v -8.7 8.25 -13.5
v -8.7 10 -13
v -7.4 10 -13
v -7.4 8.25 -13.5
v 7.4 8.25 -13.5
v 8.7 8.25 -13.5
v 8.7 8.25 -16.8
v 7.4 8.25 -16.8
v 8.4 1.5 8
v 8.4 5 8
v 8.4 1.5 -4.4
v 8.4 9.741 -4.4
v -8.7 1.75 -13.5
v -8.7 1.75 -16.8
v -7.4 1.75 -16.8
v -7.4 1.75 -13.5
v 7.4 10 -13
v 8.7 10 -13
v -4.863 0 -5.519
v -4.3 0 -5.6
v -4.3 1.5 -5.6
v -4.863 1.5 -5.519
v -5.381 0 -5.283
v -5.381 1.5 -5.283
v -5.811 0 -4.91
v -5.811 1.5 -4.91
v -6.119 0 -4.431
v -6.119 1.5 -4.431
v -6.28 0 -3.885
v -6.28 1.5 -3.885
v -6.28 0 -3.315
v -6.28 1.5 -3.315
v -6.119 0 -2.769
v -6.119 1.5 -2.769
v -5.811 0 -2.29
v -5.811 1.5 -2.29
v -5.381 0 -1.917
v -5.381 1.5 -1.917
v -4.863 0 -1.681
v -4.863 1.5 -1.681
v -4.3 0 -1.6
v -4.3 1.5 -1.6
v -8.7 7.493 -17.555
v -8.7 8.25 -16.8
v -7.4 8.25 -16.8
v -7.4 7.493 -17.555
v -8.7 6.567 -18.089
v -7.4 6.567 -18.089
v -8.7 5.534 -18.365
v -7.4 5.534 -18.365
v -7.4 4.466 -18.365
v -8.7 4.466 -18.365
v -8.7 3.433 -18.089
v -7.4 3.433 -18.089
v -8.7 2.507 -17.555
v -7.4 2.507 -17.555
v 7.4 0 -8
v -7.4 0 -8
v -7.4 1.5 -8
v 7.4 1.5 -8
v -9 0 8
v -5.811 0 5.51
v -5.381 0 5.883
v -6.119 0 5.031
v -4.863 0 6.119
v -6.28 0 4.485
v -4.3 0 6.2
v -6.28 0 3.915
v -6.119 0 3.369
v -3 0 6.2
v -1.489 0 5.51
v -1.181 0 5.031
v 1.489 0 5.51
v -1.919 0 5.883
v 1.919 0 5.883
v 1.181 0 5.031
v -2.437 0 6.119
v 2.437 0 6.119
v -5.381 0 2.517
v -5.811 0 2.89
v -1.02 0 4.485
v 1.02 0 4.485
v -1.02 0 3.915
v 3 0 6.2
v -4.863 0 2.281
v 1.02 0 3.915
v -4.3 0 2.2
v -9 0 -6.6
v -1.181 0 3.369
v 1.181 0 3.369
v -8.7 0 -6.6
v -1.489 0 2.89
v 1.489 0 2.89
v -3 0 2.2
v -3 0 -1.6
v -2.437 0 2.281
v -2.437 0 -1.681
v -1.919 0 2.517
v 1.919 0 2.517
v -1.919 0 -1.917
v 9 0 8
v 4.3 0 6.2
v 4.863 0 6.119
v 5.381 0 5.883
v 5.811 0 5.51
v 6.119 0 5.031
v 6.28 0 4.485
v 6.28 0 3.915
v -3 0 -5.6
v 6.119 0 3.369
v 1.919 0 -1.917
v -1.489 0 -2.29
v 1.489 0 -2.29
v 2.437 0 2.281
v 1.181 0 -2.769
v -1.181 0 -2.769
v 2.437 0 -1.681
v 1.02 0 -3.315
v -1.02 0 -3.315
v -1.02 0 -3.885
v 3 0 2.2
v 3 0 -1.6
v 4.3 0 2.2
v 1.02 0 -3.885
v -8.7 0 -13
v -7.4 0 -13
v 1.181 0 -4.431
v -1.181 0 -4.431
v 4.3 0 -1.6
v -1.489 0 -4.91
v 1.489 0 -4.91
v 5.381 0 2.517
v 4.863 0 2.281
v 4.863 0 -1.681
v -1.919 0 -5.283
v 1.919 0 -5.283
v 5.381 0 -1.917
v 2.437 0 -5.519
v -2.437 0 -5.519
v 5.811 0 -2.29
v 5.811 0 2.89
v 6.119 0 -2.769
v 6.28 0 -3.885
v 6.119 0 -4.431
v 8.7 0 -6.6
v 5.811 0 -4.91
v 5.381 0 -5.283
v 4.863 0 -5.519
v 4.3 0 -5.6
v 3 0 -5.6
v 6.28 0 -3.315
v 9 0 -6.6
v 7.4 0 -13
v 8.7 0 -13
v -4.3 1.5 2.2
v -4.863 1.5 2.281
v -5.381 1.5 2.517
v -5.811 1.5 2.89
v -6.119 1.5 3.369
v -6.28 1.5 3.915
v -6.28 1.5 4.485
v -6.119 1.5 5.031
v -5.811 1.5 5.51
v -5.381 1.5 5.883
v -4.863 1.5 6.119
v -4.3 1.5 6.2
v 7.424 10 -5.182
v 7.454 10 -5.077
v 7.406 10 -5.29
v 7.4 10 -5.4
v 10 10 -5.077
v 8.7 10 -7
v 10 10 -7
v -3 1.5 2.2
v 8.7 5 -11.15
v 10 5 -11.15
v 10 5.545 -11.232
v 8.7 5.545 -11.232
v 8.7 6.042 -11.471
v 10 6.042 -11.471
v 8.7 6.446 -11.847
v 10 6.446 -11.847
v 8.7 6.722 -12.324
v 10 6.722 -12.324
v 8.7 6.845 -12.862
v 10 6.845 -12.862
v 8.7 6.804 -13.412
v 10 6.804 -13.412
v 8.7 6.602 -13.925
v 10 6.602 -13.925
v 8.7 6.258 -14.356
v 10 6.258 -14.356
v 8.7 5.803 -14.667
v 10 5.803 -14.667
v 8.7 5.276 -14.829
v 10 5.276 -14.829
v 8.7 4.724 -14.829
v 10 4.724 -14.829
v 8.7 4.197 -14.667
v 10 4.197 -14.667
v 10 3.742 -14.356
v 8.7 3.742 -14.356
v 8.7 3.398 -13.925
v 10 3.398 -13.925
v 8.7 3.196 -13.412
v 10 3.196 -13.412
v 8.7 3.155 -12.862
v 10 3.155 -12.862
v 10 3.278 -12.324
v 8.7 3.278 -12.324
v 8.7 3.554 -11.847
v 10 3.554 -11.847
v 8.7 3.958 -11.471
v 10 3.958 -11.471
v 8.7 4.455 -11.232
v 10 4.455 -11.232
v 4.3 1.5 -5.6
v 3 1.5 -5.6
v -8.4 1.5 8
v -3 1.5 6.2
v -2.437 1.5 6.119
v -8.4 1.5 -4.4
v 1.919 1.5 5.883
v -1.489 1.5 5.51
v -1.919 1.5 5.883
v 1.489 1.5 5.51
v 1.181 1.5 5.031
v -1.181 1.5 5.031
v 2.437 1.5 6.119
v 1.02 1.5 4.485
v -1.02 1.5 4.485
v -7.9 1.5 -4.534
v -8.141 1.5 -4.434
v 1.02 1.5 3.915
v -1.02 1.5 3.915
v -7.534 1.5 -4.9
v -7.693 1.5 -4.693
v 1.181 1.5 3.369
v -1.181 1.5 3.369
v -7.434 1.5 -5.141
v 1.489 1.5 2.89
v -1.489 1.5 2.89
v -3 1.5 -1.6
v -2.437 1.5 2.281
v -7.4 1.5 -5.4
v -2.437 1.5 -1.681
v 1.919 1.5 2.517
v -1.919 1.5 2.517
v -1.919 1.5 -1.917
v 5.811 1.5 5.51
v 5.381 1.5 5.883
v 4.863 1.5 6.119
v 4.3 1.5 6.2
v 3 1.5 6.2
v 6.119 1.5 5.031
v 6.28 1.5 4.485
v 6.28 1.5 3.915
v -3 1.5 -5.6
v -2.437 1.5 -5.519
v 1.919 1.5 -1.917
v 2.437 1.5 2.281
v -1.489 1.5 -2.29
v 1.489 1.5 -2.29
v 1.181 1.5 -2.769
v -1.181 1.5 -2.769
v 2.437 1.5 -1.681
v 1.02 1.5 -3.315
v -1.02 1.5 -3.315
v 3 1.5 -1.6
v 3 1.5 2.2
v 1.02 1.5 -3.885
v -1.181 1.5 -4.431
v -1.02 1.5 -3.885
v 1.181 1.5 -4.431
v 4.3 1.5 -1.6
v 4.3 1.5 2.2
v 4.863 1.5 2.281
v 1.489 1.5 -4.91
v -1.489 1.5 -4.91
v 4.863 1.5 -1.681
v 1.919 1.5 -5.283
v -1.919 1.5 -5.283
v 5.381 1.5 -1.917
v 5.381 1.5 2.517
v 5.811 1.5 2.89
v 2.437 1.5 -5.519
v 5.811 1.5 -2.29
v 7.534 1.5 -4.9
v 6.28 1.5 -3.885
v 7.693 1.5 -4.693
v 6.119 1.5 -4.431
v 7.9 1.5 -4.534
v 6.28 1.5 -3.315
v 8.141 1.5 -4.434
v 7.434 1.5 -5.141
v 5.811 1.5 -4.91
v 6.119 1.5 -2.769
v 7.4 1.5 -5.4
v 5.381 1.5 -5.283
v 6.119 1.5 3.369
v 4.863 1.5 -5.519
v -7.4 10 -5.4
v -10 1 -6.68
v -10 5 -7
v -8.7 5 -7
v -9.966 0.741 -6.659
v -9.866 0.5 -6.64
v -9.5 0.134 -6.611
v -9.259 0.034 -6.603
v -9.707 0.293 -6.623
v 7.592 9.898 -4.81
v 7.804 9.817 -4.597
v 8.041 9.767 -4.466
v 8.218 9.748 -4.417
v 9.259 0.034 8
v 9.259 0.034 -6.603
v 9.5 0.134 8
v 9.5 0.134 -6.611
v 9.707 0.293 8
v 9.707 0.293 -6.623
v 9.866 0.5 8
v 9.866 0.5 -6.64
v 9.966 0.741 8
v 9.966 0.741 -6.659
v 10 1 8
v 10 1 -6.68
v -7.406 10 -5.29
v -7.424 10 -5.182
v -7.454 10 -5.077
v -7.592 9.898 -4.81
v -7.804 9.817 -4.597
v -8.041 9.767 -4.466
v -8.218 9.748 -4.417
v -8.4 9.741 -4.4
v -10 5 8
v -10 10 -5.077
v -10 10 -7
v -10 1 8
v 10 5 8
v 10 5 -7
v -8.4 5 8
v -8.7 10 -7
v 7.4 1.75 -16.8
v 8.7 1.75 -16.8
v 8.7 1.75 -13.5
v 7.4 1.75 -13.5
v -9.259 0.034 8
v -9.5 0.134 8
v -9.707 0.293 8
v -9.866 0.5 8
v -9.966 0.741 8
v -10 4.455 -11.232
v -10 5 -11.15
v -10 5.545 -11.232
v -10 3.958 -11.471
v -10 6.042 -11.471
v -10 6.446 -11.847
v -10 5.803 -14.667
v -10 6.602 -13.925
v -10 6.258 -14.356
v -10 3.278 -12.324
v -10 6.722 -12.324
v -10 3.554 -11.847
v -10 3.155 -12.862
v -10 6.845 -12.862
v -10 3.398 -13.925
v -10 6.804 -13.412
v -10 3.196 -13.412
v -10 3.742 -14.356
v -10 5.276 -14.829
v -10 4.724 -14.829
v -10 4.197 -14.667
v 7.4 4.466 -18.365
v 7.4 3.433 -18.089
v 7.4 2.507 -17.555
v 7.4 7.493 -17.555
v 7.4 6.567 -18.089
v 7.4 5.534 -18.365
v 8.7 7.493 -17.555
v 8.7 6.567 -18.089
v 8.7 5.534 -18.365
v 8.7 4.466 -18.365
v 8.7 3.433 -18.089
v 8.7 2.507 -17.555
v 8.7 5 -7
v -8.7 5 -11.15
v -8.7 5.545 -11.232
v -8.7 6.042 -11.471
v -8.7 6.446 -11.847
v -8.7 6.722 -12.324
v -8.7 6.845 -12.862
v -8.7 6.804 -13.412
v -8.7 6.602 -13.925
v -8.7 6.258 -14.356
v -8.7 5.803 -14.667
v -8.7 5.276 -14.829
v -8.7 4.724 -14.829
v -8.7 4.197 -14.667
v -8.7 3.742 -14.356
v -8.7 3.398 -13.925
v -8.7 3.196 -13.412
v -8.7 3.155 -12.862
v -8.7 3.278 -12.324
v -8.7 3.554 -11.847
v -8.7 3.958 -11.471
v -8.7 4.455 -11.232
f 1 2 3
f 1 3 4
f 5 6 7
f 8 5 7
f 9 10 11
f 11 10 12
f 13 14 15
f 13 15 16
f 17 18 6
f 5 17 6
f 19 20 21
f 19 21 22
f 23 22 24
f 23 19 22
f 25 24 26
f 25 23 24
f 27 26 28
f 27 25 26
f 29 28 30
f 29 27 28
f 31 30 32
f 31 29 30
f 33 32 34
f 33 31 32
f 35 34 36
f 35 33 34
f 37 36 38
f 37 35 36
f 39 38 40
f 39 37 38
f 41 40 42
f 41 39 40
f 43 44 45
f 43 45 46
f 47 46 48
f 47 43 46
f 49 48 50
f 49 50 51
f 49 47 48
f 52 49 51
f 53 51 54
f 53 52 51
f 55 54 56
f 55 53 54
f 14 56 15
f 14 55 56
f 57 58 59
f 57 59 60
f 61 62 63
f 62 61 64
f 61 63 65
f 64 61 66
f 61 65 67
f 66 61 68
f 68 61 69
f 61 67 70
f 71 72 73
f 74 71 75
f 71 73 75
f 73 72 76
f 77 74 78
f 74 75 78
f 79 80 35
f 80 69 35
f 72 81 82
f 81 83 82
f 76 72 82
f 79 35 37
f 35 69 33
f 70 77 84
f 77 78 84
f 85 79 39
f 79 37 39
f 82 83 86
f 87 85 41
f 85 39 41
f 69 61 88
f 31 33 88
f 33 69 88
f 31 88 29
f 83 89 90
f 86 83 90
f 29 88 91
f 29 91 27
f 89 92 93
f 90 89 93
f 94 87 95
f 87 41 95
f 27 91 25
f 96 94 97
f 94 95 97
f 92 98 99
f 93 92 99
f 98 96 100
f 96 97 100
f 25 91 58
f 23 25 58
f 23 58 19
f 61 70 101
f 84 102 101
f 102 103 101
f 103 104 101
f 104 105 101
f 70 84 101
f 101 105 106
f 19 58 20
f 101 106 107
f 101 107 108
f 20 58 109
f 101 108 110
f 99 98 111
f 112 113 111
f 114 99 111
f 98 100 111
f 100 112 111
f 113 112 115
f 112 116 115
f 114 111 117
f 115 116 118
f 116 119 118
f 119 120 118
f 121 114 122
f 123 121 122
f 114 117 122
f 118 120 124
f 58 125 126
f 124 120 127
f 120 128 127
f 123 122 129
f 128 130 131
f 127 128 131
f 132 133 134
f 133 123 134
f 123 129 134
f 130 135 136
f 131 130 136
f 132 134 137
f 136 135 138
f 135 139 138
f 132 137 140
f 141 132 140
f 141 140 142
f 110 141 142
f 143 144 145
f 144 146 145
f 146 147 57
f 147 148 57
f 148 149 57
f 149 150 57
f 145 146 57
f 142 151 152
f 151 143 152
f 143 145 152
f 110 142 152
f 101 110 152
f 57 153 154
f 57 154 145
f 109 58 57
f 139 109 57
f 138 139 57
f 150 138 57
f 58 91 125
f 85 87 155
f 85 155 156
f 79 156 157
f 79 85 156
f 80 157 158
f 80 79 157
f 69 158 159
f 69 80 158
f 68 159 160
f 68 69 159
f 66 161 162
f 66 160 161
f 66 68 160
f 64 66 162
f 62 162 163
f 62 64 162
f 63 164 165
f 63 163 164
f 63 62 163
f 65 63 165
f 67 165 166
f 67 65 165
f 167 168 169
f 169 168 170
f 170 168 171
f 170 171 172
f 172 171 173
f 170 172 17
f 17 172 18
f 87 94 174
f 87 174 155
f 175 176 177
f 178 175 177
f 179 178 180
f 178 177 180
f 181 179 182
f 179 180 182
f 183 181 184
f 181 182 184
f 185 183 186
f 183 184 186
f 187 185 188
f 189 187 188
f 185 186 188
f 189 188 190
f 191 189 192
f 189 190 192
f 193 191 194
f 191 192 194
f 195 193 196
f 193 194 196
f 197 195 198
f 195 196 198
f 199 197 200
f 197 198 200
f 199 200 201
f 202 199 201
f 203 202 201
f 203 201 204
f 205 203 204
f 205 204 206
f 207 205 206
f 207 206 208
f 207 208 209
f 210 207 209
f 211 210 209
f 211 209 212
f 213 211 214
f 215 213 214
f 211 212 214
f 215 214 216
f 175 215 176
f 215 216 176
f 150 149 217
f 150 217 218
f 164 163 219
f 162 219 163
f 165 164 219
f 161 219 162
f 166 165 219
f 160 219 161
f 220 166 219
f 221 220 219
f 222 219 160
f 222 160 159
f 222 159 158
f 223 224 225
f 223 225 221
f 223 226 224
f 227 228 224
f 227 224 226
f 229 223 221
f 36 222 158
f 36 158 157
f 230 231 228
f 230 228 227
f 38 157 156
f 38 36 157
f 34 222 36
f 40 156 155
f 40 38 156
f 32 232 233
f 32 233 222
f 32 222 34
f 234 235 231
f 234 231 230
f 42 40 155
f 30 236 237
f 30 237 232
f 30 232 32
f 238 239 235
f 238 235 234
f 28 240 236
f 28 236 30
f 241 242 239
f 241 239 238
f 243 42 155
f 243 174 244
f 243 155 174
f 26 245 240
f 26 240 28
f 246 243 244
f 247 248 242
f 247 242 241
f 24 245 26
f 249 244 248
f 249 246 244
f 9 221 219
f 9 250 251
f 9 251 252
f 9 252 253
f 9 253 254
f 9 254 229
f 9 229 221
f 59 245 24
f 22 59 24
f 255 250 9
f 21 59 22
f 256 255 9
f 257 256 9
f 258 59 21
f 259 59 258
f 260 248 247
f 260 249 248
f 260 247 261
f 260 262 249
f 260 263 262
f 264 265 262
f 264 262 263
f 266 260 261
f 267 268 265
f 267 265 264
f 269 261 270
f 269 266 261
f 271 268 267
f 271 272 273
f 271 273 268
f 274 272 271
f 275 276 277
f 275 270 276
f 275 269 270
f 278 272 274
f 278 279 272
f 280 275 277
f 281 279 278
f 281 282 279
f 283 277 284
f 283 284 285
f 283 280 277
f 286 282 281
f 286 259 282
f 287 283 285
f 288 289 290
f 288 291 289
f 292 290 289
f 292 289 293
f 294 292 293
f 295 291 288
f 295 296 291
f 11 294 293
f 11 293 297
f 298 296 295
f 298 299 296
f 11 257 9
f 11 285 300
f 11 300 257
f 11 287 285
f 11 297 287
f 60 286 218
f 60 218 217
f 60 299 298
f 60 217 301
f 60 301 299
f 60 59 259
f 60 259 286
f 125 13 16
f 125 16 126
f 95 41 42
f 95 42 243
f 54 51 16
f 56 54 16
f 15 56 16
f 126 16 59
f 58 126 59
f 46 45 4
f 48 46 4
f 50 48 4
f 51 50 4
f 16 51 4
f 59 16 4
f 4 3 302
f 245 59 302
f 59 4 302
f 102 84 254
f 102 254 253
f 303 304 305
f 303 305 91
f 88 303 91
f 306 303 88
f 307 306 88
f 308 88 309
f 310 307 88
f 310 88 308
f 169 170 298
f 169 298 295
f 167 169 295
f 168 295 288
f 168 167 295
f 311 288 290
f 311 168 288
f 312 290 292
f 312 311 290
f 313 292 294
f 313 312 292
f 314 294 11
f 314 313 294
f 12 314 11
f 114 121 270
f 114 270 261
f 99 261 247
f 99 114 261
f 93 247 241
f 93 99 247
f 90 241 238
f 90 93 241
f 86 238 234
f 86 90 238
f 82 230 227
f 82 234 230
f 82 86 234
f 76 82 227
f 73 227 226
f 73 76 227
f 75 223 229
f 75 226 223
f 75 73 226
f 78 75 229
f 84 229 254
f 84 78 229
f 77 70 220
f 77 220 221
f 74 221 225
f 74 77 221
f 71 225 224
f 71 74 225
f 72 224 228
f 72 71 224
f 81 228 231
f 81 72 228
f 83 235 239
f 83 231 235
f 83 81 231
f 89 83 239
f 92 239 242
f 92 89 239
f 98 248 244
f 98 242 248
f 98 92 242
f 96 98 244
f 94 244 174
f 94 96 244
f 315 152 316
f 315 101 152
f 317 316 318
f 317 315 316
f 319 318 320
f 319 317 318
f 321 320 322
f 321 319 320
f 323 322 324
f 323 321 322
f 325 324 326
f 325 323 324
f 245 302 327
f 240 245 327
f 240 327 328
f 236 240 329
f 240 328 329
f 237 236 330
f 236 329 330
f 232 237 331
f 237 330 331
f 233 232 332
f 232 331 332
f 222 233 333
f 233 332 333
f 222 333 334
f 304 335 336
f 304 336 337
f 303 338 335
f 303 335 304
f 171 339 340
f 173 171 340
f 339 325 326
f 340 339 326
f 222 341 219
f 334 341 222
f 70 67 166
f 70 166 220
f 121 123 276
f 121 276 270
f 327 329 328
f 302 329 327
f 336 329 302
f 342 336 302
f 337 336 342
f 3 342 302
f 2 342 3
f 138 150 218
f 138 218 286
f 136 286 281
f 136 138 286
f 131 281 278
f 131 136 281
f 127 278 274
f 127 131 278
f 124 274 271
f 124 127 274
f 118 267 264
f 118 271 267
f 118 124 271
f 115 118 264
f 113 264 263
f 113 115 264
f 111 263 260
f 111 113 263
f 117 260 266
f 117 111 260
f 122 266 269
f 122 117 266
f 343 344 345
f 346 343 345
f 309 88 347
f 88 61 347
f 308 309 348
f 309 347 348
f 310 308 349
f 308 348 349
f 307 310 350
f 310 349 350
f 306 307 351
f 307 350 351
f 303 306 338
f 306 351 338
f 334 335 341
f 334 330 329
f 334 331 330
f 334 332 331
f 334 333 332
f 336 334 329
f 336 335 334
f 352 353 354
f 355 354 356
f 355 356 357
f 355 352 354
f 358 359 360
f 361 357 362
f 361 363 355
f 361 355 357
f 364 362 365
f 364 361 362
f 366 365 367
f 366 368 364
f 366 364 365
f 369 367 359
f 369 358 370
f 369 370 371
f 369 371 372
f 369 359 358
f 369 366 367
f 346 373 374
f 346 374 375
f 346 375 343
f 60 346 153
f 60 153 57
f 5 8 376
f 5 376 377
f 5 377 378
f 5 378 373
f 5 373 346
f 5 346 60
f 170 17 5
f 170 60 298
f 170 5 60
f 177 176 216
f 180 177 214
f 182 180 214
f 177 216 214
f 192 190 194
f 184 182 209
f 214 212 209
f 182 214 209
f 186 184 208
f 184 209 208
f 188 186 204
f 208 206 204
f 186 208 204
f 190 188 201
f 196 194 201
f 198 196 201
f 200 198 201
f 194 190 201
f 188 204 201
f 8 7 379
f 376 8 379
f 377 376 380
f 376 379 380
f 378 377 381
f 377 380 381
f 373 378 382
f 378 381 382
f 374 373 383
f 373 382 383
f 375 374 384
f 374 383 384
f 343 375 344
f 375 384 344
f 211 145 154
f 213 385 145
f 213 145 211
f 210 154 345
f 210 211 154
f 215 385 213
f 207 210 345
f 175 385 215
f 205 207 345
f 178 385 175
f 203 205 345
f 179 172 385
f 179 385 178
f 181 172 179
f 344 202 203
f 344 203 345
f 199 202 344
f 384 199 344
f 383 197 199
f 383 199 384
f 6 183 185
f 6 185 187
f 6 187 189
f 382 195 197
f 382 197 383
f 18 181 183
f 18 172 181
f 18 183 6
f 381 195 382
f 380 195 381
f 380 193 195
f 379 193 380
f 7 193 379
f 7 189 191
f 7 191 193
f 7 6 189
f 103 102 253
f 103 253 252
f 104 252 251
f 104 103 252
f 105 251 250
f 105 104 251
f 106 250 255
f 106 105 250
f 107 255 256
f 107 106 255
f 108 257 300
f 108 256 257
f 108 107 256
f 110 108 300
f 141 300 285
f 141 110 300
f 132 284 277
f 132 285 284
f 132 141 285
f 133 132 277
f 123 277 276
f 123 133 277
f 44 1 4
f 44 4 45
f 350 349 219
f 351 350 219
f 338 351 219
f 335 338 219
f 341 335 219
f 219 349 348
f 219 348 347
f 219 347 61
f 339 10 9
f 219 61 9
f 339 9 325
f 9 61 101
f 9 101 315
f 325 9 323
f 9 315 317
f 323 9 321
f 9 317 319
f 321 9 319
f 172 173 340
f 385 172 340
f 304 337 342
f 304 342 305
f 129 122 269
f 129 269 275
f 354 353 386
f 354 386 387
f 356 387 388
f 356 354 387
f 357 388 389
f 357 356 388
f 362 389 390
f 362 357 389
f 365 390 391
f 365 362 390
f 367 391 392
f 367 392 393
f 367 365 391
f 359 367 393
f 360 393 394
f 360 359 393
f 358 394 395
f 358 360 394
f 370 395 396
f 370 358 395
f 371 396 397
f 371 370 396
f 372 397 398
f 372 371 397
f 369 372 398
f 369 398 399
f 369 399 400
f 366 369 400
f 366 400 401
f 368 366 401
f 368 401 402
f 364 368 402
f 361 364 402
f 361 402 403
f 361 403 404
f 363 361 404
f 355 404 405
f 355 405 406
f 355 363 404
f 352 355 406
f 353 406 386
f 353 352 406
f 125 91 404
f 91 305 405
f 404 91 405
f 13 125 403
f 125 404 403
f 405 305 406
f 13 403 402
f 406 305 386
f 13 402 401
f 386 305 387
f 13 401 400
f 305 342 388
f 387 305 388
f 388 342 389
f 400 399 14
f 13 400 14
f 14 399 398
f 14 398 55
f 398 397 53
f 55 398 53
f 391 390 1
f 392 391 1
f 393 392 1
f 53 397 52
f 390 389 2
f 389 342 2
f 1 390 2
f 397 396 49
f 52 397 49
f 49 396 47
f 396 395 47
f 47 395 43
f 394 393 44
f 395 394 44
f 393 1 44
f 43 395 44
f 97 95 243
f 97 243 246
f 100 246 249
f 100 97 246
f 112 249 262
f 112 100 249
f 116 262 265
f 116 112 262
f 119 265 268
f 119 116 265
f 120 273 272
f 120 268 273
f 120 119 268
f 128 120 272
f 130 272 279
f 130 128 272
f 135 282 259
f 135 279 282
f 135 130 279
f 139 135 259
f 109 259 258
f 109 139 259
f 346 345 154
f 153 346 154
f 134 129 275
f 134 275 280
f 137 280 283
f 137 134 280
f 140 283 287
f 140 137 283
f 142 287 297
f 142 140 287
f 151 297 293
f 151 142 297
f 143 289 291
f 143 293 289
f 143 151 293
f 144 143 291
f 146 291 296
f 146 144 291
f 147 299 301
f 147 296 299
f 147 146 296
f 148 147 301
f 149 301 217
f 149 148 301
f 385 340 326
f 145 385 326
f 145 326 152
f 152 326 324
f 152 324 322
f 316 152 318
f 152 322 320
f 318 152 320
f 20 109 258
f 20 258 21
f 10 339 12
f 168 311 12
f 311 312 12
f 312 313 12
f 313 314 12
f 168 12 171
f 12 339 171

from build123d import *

# Parameters (mm, degrees)
SKETCH1_W           = 20
SKETCH1_H           = 16
BOSS_EXTRUDE1_DEPTH = 1.5
BOSS_EXTRUDE2_DEPTH = 2.6
CUT_EXTRUDE1_DEPTH  = 1
SKETCH4_R           = 1.85
CUT_EXTRUDE2_DEPTH  = 1.3
CUT_EXTRUDE3_DEPTH  = 4.3
FILLET1_R           = 1


with BuildPart() as part:
    # Sketch1 → Boss-Extrude1 (new body)
    with BuildSketch(Plane(origin=(0, 0, 0), x_dir=(1, 0, 0), z_dir=(0, 1, 0))):
        Rectangle(SKETCH1_W, SKETCH1_H)
    extrude(amount=BOSS_EXTRUDE1_DEPTH)

    # Sketch2 → Boss-Extrude2 (add)
    with BuildSketch(Plane.ZY.offset(10)):
        with BuildLine():
            Line((8, 0), (8, 5))
            Line((8, 5), (-5.076696831, 10))
            Line((-5.076696831, 10), (-13, 10))
            Line((-13, 10), (-13.5, 8.25))
            Line((-13.5, 8.25), (-16.8, 8.25))
            ThreePointArc((-16.8, 8.25), (-18.4, 5), (-16.8, 1.75))
            Line((-16.8, 1.75), (-13.5, 1.75))
            Line((-13.5, 1.75), (-13, 0))
            Line((-13, 0), (8, 0))
        make_face()
    boss_extrude2 = extrude(amount=-BOSS_EXTRUDE2_DEPTH)

    # Sketch3 → Cut-Extrude1 (cut)
    with BuildSketch(Plane(origin=(-7.4, 0, 0), x_dir=(0, 0, -1), z_dir=(1, 0, 0))):
        Polygon((-8, 1.5), (4.4, 1.5), (4.4, 9.7412585), (-8, 5), align=None)
    cut_extrude1 = extrude(amount=-CUT_EXTRUDE1_DEPTH, mode=Mode.SUBTRACT)

    # Sketch4 → Cut-Extrude2 (cut)
    with BuildSketch(Plane.ZY.offset(10)):
        Polygon((-18.672915143, 10), (-7, 10), (-7, 5), (-6.6, 0), (-8.743784953, 0), (-18.672915143, 0), align=None)
        with Locations((-13, 5)):
            Circle(SKETCH4_R, mode=Mode.SUBTRACT)
    cut_extrude2 = extrude(amount=-CUT_EXTRUDE2_DEPTH, mode=Mode.SUBTRACT)

    # Mirror1: Boss-Extrude2, Cut-Extrude1, Cut-Extrude2 across plane
    add(boss_extrude2.mirror(Plane(origin=(0, 0, 0), x_dir=(0, 0, 1), z_dir=(1, 0, 0))))
    add(cut_extrude1.mirror(Plane(origin=(0, 0, 0), x_dir=(0, 0, 1), z_dir=(1, 0, 0))), mode=Mode.SUBTRACT)
    add(cut_extrude2.mirror(Plane(origin=(0, 0, 0), x_dir=(0, 0, 1), z_dir=(1, 0, 0))), mode=Mode.SUBTRACT)

    # Sketch5 → Cut-Extrude3 (cut)
    with BuildSketch(Plane.XZ):
        with BuildLine():
            Line((-4.3, 6.2), (-3, 6.2))
            ThreePointArc((-3, 6.2), (-1, 4.2), (-3, 2.2))
            Line((-3, 2.2), (-4.3, 2.2))
            ThreePointArc((-4.3, 2.2), (-6.3, 4.2), (-4.3, 6.2))
        make_face()
        with BuildLine():
            Line((3, 6.2), (4.3, 6.2))
            ThreePointArc((4.3, 6.2), (6.3, 4.2), (4.3, 2.2))
            Line((4.3, 2.2), (3, 2.2))
            ThreePointArc((3, 2.2), (1, 4.2), (3, 6.2))
        make_face()
        with BuildLine():
            Line((-4.3, -1.6), (-3, -1.6))
            ThreePointArc((-3, -1.6), (-1, -3.6), (-3, -5.6))
            Line((-3, -5.6), (-4.3, -5.6))
            ThreePointArc((-4.3, -5.6), (-6.3, -3.6), (-4.3, -1.6))
        make_face()
        with BuildLine():
            Line((3, -1.6), (4.3, -1.6))
            ThreePointArc((4.3, -1.6), (6.3, -3.6), (4.3, -5.6))
            Line((4.3, -5.6), (3, -5.6))
            ThreePointArc((3, -5.6), (1, -3.6), (3, -1.6))
        make_face()
    extrude(amount=-CUT_EXTRUDE3_DEPTH, mode=Mode.SUBTRACT)

    # Fillet1
    fillet1_edges = [part.edges().sort_by_distance(p)[0] for p in [
        (-7.4, 5.62062925, -4.4),
        (10, 0, 0.7),
        (-10, 0, 0.7),
        (7.4, 5.62062925, -4.4),
    ]]
    fillet(fillet1_edges, radius=FILLET1_R - 0.0001)  # a hair under: the kernel refuses the full size


solid = part.part
